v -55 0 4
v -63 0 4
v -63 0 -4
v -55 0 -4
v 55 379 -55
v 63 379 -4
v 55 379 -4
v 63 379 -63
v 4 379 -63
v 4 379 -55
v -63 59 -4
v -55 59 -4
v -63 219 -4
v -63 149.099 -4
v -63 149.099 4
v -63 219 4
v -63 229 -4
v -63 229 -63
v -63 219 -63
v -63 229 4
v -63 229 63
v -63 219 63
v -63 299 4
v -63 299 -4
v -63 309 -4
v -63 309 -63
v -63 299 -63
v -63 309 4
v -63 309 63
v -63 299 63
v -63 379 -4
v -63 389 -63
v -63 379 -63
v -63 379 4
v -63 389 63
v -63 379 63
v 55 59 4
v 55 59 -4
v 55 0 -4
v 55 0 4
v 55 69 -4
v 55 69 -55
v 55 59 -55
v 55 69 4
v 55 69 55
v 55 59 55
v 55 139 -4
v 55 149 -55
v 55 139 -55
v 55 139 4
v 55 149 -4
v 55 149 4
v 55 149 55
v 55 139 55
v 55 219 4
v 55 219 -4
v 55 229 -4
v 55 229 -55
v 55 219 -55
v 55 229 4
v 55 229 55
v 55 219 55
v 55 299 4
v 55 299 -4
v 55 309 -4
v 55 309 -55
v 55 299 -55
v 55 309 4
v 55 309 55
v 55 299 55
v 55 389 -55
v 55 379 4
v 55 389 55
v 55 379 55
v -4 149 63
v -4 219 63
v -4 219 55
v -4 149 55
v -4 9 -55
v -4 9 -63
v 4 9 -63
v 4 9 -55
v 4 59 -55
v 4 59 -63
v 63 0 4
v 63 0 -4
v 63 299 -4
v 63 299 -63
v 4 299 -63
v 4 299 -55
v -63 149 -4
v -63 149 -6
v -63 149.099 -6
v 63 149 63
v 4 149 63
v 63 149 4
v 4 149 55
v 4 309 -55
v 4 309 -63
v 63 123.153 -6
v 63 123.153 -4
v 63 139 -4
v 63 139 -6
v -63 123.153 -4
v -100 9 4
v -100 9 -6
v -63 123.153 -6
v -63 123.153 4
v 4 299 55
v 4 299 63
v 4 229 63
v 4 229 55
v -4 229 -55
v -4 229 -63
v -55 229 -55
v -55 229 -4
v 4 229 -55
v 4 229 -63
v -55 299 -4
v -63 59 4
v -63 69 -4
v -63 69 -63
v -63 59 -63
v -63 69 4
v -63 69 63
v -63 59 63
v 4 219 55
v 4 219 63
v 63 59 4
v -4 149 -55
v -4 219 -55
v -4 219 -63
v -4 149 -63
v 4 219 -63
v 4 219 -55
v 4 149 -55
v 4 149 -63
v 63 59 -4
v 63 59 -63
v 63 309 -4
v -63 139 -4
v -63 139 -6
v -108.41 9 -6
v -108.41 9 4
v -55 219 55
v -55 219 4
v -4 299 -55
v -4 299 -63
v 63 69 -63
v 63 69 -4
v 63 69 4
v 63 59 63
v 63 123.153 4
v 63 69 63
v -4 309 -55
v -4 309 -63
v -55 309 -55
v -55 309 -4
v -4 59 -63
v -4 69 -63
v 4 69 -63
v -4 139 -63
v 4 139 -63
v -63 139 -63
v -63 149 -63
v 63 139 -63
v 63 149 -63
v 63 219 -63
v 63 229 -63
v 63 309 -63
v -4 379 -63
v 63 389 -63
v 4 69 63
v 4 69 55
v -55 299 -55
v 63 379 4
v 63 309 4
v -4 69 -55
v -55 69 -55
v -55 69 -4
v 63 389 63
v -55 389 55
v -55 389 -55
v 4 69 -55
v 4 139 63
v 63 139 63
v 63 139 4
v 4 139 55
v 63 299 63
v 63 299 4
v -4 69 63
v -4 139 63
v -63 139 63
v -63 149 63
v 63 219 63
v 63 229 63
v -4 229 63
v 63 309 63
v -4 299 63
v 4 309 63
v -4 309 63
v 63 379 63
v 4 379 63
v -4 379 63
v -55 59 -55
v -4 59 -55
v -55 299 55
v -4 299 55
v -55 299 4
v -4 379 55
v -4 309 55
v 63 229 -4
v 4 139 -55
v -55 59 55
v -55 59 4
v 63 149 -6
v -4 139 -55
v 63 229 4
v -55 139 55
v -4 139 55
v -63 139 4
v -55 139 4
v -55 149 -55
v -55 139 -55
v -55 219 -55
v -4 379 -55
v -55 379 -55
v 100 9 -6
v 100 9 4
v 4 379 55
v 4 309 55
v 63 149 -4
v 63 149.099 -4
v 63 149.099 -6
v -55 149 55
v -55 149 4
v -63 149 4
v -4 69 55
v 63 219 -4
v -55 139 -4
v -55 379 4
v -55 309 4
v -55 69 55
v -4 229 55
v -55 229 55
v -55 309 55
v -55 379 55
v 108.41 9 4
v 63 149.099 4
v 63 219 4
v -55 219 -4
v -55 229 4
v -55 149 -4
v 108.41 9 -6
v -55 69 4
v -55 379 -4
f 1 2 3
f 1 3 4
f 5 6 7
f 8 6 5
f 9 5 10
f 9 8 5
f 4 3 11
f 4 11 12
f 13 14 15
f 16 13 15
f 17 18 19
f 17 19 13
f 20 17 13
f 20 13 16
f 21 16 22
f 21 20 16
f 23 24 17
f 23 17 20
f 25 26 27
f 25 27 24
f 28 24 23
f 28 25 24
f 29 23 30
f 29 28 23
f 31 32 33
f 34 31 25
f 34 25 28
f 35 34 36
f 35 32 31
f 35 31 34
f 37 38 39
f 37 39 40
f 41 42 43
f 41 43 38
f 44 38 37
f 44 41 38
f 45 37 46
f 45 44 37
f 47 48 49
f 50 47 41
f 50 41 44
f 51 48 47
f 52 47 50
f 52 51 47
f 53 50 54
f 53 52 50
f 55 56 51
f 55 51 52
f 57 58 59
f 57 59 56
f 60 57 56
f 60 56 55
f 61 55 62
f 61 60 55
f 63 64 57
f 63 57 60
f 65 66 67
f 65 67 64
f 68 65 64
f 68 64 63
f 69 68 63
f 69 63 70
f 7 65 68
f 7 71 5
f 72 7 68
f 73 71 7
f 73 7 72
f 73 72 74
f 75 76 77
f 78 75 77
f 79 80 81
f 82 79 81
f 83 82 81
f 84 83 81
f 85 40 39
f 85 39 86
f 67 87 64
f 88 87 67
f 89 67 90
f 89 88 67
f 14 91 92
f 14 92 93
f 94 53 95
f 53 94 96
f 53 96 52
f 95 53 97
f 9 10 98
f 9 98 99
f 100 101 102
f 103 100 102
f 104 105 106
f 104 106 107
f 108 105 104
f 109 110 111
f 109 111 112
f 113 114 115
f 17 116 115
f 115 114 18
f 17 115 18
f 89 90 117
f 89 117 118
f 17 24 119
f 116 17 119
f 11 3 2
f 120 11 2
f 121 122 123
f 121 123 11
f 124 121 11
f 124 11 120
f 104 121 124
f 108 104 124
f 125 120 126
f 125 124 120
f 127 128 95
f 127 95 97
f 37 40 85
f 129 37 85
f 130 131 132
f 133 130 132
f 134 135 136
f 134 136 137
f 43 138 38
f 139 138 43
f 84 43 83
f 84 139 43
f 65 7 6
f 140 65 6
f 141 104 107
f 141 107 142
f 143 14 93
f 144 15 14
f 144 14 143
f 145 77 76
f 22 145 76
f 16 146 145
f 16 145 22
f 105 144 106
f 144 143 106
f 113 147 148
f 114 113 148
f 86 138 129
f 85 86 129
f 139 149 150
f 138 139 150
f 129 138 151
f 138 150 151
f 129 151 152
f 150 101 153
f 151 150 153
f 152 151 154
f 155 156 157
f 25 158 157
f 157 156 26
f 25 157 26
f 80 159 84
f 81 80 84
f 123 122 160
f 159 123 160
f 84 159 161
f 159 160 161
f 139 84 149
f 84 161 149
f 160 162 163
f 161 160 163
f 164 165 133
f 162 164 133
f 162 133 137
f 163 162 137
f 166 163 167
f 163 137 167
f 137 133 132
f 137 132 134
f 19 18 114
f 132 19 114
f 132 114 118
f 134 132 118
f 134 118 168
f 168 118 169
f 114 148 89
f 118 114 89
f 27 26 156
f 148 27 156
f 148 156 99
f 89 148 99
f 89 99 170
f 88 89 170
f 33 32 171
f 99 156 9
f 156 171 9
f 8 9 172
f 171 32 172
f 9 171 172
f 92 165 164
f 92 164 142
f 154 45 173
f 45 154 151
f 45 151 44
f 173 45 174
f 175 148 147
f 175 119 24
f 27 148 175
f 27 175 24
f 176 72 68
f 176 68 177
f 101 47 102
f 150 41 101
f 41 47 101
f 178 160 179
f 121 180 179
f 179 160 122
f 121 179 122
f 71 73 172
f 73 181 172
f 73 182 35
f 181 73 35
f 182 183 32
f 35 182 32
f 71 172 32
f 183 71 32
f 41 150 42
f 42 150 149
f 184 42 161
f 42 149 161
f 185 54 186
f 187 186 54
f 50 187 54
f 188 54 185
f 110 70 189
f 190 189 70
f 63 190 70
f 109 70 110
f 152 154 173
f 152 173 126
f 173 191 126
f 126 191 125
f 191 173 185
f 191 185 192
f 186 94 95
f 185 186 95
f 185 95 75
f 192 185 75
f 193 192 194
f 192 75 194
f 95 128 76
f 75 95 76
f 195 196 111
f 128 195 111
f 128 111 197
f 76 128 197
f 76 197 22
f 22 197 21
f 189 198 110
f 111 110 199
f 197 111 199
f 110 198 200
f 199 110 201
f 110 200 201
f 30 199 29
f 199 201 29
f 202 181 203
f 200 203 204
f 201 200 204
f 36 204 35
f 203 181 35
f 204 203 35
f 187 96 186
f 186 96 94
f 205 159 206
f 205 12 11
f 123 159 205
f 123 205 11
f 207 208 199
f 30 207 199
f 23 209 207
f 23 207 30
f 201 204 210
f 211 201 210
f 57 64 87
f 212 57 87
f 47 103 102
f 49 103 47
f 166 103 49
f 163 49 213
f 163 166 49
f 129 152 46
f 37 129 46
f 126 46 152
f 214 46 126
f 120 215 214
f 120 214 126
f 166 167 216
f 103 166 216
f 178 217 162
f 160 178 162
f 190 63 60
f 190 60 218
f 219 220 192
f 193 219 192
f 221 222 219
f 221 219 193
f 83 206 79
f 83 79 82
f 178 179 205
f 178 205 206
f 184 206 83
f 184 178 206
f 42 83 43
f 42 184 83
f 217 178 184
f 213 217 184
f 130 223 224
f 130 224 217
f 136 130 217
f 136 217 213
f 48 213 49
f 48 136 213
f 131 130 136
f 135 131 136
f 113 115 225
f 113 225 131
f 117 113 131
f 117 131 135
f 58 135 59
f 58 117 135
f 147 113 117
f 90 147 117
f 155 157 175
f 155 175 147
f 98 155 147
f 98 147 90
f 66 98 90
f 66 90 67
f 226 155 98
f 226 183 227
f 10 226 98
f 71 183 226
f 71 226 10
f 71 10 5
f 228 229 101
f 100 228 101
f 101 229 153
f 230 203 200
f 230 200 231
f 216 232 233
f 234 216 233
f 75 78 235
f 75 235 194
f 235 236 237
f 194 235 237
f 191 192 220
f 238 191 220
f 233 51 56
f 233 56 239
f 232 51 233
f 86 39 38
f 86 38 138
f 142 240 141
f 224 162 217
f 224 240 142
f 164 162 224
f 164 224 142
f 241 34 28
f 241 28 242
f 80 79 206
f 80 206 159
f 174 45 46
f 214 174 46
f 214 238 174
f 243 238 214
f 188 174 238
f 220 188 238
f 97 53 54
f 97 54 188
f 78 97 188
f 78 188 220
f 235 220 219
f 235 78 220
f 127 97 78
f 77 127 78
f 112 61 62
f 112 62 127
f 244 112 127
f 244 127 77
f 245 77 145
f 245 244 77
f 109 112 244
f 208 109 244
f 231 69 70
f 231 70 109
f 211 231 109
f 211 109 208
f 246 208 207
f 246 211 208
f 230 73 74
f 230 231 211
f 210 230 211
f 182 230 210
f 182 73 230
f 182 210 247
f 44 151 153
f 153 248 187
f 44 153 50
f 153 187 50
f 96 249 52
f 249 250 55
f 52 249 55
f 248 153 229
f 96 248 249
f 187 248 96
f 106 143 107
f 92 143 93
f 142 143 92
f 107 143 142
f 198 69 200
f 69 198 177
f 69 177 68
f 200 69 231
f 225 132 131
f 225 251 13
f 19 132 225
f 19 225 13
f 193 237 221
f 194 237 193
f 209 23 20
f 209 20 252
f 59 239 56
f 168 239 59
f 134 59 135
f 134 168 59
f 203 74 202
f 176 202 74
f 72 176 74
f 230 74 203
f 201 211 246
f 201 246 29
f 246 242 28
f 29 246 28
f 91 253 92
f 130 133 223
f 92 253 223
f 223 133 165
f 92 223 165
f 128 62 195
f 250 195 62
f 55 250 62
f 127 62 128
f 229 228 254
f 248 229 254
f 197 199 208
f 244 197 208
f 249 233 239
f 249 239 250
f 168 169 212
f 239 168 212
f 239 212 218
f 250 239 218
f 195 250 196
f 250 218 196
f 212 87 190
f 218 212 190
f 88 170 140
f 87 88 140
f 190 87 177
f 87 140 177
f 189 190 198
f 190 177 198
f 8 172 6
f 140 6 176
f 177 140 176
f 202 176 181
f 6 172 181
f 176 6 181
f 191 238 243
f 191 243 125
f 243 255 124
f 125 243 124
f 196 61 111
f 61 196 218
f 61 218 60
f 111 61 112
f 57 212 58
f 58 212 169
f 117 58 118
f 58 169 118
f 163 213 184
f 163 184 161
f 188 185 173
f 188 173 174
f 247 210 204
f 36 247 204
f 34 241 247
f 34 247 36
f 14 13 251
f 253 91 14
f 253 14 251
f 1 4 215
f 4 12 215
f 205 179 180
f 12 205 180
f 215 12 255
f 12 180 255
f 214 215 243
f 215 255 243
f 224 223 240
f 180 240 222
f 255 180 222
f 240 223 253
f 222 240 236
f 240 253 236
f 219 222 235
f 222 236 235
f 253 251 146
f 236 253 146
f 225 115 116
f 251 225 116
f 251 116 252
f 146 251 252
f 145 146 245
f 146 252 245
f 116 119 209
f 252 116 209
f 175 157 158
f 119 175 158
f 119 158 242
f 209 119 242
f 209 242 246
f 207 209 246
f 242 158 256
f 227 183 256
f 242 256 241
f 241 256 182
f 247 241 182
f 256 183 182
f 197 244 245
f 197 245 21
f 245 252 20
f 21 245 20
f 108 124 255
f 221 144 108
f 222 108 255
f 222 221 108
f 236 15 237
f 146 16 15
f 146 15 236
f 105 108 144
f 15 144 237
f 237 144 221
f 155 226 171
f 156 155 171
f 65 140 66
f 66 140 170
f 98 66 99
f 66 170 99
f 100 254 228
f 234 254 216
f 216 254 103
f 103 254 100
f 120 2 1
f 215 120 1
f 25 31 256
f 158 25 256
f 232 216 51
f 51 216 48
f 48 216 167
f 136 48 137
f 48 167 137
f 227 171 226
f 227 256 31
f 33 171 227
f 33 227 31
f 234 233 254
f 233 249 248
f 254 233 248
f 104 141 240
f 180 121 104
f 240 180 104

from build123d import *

# Parameters (mm, degrees)
SKETCH_1_W               = 105
SKETCH_1_H               = 105
EXTRUDE_1_DEPTH          = 9
SKETCH_2_R               = 5.5
CUT_EXTRUDE_1_DEPTH      = 9
SKETCH_4_W               = 10
SKETCH_4_H               = 10
EXTRUDE_2_DEPTH          = 30
SKETCH_5_R               = 12.5
EXTRUDE_3_DEPTH          = 10
SKETCH_6_W               = 8
SKETCH_6_H               = 8
EXTRUDE_4_DEPTH          = 380
EXTRUDE_5_DEPTH          = 10
PATTERN_LINEAR_1_COUNT   = 5
PATTERN_LINEAR_1_PITCH   = 80
EXTRUDE_6_DEPTH          = 10
SKETCH_9_W               = 105
SKETCH_9_H               = 15
CUT_EXTRUDE_2_DEPTH      = 59
SPLIT_START              = -31.043560763
SPLIT_BODIES_2_OUTLINE_R = 5.5
SPLIT_BODIES_2_DEPTH     = 40.043560763
SKETCH_10_W              = 8
SKETCH_10_H              = 8
EXTRUDE_8_DEPTH          = 9


# Read off the part's stored shape, not the designer's step: 分割2
with BuildPart() as part:
    # 草图1 → 凸台-拉伸1 (new body)
    with BuildSketch(Plane(origin=(0, 0, 0), x_dir=(1, 0, 0), z_dir=(0, 1, 0))):
        with BuildLine():
            Line((-102.5, 102.5), (102.5, 102.5))
            Line((102.5, 102.5), (146.930137945, 8.550357413))
            ThreePointArc((146.930137945, 8.550357413), (148.85, 0), (146.930137945, -8.550357413))
            Line((146.930137945, -8.550357413), (90, -67.5))
            Line((90, -67.5), (52.5, -67.5))
            Line((52.5, -67.5), (-52.5, -67.5))
            Line((-52.5, -67.5), (-90, -67.5))
            Line((-90, -67.5), (-146.930137945, -8.550357413))
            ThreePointArc((-146.930137945, -8.550357413), (-148.85, 0), (-146.930137945, 8.550357413))
            Line((-146.930137945, 8.550357413), (-102.5, 102.5))
        make_face()
        Rectangle(SKETCH_1_W, SKETCH_1_H, mode=Mode.SUBTRACT)
    extrude(amount=EXTRUDE_1_DEPTH)

    # 草图2 → 切除-拉伸1 (cut)
    with BuildSketch(Plane(origin=(0, 9, 0), x_dir=(1, 0, 0), z_dir=(0, 1, 0))):
        with Locations(Location((-128.85, 0, 0), (0, 0, 270))):
            Circle(SKETCH_2_R)
        with Locations(Location((128.85, 0, 0), (0, 0, 270))):
            Circle(SKETCH_2_R)
    extrude(amount=-CUT_EXTRUDE_1_DEPTH, mode=Mode.SUBTRACT)

    # 草图4 → 凸台-拉伸2 (add)
    with BuildSketch(Plane.XZ):
        with Locations((-92, 0)):
            Rectangle(SKETCH_4_W, SKETCH_4_H)
        with Locations((92, 0)):
            Rectangle(SKETCH_4_W, SKETCH_4_H)
    extrude(amount=EXTRUDE_2_DEPTH)

    # 草图5 → 凸台-拉伸3 (add)
    with BuildSketch(Plane.ZY.offset(-87)):
        with Locations((0, -18.543560763)):
            Circle(SKETCH_5_R)
    extrude_3 = extrude(amount=-EXTRUDE_3_DEPTH)

    # 镜向1: 凸台-拉伸3 across plane
    add(extrude_3.mirror(Plane(origin=(0, 0, 0), x_dir=(0, 0, 1), z_dir=(1, 0, 0))))

    # 草图6 → 凸台-拉伸4 (add)
    with BuildSketch(Plane(origin=(0, 9, 0), x_dir=(1, 0, 0), z_dir=(0, 1, 0))):
        with Locations((-59, 0)):
            Rectangle(SKETCH_6_W, SKETCH_6_H)
        with Locations((59, 0)):
            Rectangle(SKETCH_6_W, SKETCH_6_H)
        with Locations((0, 59)):
            Rectangle(SKETCH_6_W, SKETCH_6_H)
        with Locations((0, -59)):
            Rectangle(SKETCH_6_W, SKETCH_6_H)
    extrude(amount=EXTRUDE_4_DEPTH)

    # 草图7 → 凸台-拉伸5 (add)
    with BuildSketch(Plane(origin=(0, 389, 0), x_dir=(1, 0, 0), z_dir=(0, 1, 0))):
        Polygon((-63, 4), (-63, 63), (63, 63), (63, -63), (-63, -63), align=None)
        Polygon((-55, 4), (-55, 55), (55, 55), (55, -55), (-55, -55), align=None, mode=Mode.SUBTRACT)
    extrude_5 = extrude(amount=-EXTRUDE_5_DEPTH)

    # 阵列(线性)1: 凸台-拉伸5 ×5
    with Locations(*[(0, -i * PATTERN_LINEAR_1_PITCH, 0) for i in range(1, PATTERN_LINEAR_1_COUNT)]):
        add(extrude_5)

    # 草图8 → 凸台-拉伸6 (add)
    with BuildSketch(Plane.XY.offset(4)):
        Polygon((-100, 9), (-63, 123.153405556), (-63, 149.099351502), (-108.409735963, 9), align=None)
        Polygon((108.409735963, 9), (100, 9), (63, 123.153405556), (63, 149.099351502), align=None)
    extrude(amount=-EXTRUDE_6_DEPTH)

    # 草图9 → 切除-拉伸2 (cut)
    with BuildSketch(Plane.XZ):
        with Locations((0, 60)):
            Rectangle(SKETCH_9_W, SKETCH_9_H)
    extrude(amount=-CUT_EXTRUDE_2_DEPTH, mode=Mode.SUBTRACT)

    # Split Bodies 2 outline → Split Bodies 2 (cut)
    with BuildSketch(Plane(origin=(0, 0, 0), x_dir=(1, 0, 0), z_dir=(0, 1, 0)).offset(SPLIT_START)):
        with BuildLine():
            Line((-90, -67.5), (-52.5, -67.5))
            Line((-52.5, -67.5), (-52.5, 52.5))
            Line((-52.5, 52.5), (52.5, 52.5))
            Line((52.5, 52.5), (52.5, -67.5))
            Line((52.5, -67.5), (90, -67.5))
            Line((90, -67.5), (146.930137945, -8.550357413))
            ThreePointArc((146.930137945, -8.550357413), (148.85, 0), (146.930137945, 8.550357413))
            Line((146.930137945, 8.550357413), (102.5, 102.5))
            Line((102.5, 102.5), (-102.5, 102.5))
            Line((-102.5, 102.5), (-146.930137945, 8.550357413))
            ThreePointArc((-146.930137945, 8.550357413), (-148.85, 0), (-146.930137945, -8.550357413))
            Line((-146.930137945, -8.550357413), (-90, -67.5))
        make_face()
        with Locations((-128.85, 0)):
            Circle(SPLIT_BODIES_2_OUTLINE_R, mode=Mode.SUBTRACT)
        with Locations((128.85, 0)):
            Circle(SPLIT_BODIES_2_OUTLINE_R, mode=Mode.SUBTRACT)
    extrude(amount=SPLIT_BODIES_2_DEPTH, mode=Mode.SUBTRACT)

    # 草图10 → 凸台-拉伸8 (add)
    with BuildSketch(Plane.XZ.offset(-9)):
        with Locations((-59, 0)):
            Rectangle(SKETCH_10_W, SKETCH_10_H)
        with Locations((59, 0)):
            Rectangle(SKETCH_10_W, SKETCH_10_H)
    extrude(amount=EXTRUDE_8_DEPTH)


solid = part.part
